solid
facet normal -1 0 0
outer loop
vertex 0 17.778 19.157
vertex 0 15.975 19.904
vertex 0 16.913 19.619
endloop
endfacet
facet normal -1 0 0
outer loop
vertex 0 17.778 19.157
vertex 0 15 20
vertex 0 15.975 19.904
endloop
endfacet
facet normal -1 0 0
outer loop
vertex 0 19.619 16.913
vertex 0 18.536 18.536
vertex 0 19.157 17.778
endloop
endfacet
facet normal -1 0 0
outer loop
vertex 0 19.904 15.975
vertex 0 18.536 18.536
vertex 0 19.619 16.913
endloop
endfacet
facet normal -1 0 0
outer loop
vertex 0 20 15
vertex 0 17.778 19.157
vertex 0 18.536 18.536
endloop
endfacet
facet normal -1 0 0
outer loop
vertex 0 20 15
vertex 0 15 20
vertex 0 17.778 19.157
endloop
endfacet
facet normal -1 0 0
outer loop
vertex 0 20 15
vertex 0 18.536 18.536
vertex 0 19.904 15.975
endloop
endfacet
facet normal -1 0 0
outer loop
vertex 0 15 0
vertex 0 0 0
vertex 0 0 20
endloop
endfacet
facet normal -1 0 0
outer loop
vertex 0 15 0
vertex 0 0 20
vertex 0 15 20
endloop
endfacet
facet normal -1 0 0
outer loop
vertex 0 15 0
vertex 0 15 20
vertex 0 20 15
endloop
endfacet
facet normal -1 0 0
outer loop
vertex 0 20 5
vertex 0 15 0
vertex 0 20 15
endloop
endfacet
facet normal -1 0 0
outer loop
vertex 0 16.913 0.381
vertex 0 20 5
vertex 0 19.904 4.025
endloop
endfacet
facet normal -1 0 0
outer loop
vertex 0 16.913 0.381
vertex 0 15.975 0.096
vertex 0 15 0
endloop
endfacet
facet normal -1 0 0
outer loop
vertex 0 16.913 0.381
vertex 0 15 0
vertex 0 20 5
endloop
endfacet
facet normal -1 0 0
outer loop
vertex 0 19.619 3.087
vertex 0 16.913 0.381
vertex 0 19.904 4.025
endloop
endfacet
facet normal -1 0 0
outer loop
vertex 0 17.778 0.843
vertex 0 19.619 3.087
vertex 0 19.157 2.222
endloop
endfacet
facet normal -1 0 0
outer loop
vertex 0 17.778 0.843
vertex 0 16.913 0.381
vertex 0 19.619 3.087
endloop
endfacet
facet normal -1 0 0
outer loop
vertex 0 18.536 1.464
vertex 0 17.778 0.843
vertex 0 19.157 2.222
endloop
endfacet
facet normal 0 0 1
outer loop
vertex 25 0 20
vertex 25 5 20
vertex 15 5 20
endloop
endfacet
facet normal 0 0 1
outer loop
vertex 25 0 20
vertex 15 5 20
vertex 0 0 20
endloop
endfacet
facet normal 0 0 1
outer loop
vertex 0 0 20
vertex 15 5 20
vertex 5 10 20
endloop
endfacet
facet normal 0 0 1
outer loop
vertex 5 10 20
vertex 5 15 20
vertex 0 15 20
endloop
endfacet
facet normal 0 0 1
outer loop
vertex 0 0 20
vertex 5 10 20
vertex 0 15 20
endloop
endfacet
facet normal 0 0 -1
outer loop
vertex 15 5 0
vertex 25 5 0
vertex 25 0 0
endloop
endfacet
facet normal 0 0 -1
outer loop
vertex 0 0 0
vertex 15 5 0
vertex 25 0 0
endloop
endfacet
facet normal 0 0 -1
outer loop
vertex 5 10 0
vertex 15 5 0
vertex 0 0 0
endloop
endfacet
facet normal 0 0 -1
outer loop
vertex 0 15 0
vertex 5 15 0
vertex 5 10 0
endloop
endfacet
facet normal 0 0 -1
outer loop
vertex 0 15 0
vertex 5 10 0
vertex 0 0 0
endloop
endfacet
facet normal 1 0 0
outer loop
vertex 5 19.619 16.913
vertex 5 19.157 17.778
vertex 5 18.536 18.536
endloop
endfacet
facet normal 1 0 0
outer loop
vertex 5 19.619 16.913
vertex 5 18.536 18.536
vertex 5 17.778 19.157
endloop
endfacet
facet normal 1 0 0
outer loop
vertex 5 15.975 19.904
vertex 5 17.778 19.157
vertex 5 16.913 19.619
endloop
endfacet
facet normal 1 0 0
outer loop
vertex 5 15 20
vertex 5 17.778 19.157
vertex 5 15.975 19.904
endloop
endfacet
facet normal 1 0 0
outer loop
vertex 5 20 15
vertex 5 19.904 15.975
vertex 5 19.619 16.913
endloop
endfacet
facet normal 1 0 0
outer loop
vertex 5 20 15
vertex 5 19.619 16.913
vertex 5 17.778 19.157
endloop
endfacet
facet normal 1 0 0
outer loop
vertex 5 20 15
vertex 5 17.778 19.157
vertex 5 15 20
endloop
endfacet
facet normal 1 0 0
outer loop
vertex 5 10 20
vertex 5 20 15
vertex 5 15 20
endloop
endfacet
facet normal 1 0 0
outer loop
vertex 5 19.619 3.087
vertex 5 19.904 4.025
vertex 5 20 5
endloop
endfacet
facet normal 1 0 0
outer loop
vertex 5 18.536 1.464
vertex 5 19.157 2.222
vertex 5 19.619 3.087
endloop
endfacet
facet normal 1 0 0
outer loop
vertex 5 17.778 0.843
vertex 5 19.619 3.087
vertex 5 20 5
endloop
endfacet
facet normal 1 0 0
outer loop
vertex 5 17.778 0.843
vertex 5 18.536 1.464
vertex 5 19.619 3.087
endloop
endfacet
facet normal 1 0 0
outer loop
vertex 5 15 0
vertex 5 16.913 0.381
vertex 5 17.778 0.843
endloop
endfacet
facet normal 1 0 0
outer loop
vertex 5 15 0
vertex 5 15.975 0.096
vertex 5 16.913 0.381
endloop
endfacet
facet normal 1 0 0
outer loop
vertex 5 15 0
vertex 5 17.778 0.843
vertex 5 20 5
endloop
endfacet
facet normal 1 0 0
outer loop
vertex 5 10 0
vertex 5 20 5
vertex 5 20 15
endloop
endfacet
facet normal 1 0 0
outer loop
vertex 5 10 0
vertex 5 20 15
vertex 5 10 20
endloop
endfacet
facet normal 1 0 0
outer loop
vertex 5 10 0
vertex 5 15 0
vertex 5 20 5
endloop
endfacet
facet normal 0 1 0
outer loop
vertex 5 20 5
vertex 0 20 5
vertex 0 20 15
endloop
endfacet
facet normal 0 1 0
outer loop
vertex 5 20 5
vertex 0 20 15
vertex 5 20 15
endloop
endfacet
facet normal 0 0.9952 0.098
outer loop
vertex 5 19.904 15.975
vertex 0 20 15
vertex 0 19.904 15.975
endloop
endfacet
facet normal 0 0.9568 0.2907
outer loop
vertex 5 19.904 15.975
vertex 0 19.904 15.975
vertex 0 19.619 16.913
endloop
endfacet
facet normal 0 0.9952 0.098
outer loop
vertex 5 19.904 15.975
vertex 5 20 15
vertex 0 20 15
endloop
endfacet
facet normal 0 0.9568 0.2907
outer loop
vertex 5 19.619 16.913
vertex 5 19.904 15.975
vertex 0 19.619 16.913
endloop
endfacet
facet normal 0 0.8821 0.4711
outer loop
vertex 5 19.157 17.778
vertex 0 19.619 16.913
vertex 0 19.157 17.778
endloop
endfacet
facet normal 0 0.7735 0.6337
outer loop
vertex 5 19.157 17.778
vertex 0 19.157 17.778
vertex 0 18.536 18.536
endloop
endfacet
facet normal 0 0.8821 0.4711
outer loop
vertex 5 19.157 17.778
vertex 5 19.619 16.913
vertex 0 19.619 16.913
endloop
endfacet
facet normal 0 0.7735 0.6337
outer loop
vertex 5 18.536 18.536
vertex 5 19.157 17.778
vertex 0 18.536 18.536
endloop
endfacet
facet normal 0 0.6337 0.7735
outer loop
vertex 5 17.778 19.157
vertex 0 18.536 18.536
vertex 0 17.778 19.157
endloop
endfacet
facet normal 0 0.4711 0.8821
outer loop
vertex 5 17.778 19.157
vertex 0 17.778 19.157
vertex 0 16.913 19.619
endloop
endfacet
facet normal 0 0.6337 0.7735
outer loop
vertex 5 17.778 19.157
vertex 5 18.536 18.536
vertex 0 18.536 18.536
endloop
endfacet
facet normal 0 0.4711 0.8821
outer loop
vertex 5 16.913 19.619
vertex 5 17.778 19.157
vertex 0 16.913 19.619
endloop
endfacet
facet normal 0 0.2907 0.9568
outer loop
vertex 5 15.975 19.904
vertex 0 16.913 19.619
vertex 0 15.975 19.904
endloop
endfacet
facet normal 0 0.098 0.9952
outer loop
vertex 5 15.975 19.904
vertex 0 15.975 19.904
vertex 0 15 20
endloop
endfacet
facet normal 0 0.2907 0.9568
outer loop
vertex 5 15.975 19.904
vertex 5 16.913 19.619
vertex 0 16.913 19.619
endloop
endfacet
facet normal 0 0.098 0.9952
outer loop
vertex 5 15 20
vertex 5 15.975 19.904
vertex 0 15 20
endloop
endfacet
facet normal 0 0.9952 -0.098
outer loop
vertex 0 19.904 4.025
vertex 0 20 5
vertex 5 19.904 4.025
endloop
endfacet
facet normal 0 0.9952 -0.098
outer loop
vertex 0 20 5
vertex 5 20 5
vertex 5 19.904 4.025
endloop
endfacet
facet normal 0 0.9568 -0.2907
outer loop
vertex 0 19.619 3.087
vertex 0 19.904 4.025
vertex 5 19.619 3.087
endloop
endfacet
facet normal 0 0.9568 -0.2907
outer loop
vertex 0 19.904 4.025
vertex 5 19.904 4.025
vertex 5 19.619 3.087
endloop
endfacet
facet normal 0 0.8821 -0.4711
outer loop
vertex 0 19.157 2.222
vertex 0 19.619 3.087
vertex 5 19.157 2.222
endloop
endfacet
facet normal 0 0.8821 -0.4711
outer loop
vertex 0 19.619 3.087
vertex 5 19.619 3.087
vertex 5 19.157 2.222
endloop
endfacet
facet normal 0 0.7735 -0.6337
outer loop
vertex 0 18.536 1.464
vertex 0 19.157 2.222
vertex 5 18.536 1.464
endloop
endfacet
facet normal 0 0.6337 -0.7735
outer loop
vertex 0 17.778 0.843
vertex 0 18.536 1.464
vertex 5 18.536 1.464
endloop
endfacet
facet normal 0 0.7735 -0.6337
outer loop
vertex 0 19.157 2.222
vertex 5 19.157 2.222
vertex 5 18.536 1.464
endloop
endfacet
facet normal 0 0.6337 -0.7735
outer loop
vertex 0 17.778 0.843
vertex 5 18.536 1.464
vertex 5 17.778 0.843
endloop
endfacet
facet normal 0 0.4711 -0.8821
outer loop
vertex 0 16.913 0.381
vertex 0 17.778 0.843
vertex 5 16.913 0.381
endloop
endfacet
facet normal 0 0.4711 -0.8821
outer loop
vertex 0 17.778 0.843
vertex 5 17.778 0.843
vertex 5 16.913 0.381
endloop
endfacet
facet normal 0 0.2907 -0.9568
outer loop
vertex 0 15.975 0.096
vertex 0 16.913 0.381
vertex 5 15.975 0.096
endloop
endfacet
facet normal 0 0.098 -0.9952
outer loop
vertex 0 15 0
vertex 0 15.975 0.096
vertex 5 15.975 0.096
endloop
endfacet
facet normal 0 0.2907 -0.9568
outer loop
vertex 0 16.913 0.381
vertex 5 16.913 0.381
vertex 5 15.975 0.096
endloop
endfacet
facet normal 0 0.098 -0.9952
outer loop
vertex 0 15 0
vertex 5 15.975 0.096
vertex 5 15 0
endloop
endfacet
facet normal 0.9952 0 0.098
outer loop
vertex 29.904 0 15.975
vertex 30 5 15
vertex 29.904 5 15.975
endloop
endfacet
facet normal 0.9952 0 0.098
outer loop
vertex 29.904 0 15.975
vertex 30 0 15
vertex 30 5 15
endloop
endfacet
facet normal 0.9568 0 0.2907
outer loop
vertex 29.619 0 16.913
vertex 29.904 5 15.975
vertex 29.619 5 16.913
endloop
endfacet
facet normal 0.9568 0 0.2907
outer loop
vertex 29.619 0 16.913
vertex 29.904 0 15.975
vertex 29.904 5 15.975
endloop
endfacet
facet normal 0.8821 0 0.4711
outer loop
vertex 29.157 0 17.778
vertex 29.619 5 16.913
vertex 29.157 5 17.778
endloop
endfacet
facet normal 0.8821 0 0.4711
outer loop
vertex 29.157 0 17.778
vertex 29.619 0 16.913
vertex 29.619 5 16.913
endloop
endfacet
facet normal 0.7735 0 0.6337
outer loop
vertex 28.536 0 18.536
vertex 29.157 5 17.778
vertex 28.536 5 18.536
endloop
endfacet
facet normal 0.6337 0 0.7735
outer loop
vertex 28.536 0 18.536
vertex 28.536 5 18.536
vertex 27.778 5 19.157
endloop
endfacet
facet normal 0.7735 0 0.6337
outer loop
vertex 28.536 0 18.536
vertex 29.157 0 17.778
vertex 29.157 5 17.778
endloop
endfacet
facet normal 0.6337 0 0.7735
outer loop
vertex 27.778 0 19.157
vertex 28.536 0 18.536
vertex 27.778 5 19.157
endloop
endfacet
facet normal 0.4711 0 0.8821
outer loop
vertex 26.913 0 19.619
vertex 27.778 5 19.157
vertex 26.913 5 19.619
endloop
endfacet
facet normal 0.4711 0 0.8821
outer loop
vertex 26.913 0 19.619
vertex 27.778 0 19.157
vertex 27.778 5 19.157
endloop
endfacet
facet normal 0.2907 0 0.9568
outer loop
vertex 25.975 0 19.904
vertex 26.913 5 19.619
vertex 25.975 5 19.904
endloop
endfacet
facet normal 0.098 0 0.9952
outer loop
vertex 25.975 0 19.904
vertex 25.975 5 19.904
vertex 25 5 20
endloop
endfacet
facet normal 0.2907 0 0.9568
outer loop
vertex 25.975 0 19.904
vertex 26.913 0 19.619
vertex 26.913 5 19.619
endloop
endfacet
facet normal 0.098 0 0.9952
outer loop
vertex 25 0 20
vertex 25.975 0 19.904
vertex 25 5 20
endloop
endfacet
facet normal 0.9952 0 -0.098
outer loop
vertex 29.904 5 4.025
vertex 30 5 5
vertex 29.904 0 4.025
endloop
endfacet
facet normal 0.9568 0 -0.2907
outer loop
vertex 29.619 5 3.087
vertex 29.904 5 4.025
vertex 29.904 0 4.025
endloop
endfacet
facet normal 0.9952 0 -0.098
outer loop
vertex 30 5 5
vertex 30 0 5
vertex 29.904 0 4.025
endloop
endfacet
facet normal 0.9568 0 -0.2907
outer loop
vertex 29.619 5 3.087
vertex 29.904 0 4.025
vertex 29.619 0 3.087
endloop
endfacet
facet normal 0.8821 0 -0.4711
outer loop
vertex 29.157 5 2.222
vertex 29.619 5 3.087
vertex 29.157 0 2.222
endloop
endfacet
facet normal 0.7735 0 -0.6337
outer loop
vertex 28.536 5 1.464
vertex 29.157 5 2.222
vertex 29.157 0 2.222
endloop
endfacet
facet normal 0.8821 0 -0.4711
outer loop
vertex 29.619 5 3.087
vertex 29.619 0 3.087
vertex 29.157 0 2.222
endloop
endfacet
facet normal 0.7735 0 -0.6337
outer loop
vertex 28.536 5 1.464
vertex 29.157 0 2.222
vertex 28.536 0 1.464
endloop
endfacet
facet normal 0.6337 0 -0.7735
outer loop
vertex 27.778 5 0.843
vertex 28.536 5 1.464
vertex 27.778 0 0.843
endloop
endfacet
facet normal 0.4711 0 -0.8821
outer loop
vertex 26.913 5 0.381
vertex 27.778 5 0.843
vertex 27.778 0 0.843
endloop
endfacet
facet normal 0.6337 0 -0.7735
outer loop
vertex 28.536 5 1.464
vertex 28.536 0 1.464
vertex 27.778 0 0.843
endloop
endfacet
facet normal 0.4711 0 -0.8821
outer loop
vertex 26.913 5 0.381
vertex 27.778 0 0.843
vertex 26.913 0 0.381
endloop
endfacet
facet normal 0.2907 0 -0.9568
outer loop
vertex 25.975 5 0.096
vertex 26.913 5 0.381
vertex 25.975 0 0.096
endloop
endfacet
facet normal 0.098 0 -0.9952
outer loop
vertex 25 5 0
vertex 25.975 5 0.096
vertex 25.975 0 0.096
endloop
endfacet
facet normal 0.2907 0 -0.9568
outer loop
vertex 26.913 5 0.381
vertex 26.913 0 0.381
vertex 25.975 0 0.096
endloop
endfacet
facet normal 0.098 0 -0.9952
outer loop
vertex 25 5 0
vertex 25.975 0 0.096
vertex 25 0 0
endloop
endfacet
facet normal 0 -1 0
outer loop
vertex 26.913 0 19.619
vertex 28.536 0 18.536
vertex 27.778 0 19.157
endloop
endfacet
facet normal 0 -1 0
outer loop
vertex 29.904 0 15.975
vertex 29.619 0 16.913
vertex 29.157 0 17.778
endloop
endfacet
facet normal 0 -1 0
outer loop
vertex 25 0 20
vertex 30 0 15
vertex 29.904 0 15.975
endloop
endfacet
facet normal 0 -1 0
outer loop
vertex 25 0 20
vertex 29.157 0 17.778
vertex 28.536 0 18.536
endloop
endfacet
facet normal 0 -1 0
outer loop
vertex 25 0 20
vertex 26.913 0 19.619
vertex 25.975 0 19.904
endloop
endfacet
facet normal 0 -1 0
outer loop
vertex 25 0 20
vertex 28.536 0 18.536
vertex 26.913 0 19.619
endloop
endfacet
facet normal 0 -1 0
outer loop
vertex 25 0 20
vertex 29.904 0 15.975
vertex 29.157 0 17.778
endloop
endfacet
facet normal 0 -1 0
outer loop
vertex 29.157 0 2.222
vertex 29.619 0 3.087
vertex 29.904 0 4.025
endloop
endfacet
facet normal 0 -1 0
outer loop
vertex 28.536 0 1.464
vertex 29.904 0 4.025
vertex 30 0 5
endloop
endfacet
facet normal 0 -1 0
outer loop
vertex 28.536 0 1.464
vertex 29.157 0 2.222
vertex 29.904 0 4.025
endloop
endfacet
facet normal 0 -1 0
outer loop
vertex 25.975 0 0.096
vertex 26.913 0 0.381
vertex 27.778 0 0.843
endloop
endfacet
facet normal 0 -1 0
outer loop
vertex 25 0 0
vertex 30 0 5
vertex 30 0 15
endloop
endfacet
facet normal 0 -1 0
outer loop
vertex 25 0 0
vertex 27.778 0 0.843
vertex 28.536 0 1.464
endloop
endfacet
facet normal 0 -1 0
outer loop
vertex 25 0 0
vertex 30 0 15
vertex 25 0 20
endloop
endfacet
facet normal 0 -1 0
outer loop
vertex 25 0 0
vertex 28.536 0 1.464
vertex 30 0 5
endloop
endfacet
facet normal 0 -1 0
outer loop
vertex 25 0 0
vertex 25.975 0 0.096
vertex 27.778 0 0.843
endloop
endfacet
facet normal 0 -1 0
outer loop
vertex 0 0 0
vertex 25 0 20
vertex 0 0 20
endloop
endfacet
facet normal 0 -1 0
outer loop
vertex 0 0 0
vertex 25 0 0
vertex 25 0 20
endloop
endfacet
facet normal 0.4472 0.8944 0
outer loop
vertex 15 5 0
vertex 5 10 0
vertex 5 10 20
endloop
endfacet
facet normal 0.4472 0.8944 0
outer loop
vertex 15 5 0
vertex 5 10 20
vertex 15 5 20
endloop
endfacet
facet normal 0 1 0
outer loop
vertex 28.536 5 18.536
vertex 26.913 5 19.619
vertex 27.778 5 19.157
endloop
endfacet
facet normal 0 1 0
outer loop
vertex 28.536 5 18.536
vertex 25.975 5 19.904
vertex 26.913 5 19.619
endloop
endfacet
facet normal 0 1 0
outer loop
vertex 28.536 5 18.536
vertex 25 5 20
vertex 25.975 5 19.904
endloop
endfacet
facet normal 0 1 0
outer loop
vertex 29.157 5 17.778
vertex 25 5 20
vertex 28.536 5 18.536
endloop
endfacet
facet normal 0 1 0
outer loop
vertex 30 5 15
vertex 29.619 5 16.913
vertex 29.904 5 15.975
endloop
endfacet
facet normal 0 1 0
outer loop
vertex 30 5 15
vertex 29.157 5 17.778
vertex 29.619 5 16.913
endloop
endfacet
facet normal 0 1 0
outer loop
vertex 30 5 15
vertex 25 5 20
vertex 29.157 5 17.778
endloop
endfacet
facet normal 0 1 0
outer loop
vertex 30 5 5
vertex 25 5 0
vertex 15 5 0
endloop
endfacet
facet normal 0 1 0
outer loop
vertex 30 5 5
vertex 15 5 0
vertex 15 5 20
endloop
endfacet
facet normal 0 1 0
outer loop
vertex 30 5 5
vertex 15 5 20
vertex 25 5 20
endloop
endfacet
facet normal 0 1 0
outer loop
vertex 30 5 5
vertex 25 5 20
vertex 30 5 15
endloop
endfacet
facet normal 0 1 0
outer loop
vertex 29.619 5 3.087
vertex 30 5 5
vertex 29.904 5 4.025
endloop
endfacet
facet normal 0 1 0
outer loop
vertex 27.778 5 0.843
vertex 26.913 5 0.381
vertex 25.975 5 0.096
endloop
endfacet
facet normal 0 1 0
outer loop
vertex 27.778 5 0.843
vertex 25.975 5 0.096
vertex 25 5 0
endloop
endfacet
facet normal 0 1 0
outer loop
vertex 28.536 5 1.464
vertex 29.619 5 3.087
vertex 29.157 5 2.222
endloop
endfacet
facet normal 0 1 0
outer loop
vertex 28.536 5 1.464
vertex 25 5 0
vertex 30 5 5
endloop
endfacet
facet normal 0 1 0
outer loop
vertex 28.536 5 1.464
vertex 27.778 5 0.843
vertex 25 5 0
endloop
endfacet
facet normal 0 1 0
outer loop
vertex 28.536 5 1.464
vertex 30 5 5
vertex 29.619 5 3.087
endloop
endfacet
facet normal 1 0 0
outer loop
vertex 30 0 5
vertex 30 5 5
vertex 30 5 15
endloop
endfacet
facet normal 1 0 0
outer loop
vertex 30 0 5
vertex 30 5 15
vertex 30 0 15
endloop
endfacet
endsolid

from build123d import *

# Parameters (mm, degrees)
EXTRUDE_1_DEPTH = 20
FILLET_1_R      = 5


with BuildPart() as part:
    # 草圖1 → 填料-伸長1 (new body)
    with BuildSketch(Plane.XY):
        Polygon((5, 10), (15, 5), (30, 5), (30, 0), (0, 0), (0, 20), (5, 20), align=None)
    extrude(amount=EXTRUDE_1_DEPTH)

    # 圓角1
    fillet_1_edges = [part.edges().sort_by_distance(p)[0] for p in [
        (2.5, 20, 20),
        (30, 2.5, 20),
        (2.5, 20, 0),
        (30, 2.5, 0),
    ]]
    fillet(fillet_1_edges, radius=FILLET_1_R)


solid = part.part
